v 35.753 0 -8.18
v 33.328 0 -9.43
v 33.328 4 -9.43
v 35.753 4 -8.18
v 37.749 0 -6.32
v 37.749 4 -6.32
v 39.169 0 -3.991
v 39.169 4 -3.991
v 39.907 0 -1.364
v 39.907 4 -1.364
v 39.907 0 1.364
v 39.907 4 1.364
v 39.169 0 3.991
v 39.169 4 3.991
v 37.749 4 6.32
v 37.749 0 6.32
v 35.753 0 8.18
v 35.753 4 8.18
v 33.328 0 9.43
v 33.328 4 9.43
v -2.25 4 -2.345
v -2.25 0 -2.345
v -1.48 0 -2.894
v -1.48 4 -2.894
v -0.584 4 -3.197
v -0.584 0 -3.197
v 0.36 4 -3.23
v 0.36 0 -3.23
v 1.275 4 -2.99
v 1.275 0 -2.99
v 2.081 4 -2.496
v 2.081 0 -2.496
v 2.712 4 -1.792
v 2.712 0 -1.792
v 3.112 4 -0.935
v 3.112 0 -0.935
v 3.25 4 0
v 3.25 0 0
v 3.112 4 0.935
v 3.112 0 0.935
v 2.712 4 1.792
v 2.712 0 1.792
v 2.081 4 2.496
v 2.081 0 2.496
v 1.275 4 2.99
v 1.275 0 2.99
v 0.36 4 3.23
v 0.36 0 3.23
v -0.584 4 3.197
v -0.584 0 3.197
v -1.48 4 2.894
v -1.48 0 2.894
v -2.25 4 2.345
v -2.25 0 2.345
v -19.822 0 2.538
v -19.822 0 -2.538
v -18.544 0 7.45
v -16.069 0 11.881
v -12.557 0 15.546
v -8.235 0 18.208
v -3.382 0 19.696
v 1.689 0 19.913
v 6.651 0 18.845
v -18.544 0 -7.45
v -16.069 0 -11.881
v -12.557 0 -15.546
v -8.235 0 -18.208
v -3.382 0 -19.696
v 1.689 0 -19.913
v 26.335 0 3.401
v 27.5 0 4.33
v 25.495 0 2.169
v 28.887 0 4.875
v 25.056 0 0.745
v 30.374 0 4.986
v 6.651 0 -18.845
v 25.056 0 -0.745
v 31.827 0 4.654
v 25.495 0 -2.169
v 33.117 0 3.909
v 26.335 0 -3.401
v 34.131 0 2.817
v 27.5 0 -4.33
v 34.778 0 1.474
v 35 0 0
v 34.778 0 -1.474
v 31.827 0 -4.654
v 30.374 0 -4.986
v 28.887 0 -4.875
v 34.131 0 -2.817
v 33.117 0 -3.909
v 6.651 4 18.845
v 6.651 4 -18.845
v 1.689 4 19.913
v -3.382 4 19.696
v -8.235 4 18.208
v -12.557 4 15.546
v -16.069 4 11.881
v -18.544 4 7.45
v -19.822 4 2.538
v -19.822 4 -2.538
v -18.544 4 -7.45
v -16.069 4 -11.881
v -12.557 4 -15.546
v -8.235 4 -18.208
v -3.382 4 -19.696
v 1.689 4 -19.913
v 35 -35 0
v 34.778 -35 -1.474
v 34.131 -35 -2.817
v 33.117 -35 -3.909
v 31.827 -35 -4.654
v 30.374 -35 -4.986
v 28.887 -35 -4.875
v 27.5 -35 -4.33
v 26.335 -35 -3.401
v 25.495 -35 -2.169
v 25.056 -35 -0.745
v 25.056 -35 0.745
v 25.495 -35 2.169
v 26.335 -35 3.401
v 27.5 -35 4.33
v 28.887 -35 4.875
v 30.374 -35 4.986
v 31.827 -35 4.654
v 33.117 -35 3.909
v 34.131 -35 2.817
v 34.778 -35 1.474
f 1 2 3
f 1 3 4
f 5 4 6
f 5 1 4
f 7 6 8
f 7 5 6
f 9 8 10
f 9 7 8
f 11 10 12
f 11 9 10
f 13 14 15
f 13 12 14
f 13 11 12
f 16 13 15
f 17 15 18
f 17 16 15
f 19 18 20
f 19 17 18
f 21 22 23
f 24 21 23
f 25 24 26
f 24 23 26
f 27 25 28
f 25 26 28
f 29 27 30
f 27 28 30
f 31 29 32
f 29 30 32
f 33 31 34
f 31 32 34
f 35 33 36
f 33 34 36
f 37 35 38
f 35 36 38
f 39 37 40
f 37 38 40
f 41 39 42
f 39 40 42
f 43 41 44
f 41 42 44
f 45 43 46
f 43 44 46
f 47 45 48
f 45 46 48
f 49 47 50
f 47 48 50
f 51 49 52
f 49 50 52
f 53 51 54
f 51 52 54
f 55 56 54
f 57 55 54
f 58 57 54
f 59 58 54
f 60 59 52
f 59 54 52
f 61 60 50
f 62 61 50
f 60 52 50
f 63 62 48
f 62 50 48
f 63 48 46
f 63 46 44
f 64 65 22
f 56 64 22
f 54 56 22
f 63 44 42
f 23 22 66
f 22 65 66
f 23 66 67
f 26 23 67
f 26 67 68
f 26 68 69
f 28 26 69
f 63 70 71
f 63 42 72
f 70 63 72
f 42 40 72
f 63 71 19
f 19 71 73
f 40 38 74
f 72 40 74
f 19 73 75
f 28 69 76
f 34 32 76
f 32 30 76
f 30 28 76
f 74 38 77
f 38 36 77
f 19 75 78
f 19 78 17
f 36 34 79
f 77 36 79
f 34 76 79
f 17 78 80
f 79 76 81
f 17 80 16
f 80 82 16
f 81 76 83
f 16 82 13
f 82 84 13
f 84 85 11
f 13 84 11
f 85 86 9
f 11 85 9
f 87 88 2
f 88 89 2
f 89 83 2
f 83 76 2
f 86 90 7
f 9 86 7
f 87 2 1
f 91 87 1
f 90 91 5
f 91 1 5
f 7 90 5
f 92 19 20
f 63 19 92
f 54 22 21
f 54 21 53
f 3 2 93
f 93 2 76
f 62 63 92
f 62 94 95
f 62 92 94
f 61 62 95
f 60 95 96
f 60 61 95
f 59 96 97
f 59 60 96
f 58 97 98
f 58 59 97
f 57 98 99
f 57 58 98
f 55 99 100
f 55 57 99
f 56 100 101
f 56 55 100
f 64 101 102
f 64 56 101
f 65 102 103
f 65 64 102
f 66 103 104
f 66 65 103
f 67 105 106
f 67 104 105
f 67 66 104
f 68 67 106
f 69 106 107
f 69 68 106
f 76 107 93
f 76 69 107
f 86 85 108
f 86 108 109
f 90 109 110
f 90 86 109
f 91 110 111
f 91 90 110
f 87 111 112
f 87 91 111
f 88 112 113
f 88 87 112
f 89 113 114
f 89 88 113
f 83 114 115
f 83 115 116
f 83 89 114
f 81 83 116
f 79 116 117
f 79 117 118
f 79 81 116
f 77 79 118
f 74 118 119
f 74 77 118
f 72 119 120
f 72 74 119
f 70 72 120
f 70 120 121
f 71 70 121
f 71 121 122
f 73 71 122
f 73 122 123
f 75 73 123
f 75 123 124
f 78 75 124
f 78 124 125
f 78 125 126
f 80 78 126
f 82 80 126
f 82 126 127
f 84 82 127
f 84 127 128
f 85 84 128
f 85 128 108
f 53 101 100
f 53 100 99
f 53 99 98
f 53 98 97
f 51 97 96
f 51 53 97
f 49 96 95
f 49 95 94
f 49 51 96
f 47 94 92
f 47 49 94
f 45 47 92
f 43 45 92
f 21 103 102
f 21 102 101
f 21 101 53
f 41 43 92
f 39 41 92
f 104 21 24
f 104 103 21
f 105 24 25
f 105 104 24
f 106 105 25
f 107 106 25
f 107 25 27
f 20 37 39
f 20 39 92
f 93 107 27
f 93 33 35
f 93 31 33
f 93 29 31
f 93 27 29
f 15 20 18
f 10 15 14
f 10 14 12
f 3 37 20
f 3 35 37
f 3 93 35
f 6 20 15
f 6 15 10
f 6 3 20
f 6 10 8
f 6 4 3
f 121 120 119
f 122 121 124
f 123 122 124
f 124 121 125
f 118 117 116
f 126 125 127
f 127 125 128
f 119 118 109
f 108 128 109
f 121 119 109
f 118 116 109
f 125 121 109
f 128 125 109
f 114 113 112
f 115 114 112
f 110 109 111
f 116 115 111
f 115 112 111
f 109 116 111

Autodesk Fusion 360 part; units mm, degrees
sketch "Sketch1" plane through (0, 0, 0) normal (0, 1, 0) x (1, 0, 0)
  circle A0 centre (30, 0) radius 5
  line L0 (33.328, 9.43) -> (6.6508, 18.845)
  line L1 (33.328, -9.43) -> (6.6508, -18.845)
  arc A1 (33.328, -9.43) -> (33.328, 9.43) centre (30, 0) ccw
  arc A2 (6.6508, 18.845) -> (6.6508, -18.845) centre (0, 0) ccw
  line L2 (-2.25, 2.3452) -> (-2.25, -2.3452)
  arc A3 (-2.25, -2.3452) -> (-2.25, 2.3452) centre (0, 0) ccw
extrude "Extrude1" add sketch "Sketch1" along normal blind 4 contours A0 | L0 L1 A1 A2
extrude "Extrude2" add sketch "Sketch1" against normal blind 35 contours A0
